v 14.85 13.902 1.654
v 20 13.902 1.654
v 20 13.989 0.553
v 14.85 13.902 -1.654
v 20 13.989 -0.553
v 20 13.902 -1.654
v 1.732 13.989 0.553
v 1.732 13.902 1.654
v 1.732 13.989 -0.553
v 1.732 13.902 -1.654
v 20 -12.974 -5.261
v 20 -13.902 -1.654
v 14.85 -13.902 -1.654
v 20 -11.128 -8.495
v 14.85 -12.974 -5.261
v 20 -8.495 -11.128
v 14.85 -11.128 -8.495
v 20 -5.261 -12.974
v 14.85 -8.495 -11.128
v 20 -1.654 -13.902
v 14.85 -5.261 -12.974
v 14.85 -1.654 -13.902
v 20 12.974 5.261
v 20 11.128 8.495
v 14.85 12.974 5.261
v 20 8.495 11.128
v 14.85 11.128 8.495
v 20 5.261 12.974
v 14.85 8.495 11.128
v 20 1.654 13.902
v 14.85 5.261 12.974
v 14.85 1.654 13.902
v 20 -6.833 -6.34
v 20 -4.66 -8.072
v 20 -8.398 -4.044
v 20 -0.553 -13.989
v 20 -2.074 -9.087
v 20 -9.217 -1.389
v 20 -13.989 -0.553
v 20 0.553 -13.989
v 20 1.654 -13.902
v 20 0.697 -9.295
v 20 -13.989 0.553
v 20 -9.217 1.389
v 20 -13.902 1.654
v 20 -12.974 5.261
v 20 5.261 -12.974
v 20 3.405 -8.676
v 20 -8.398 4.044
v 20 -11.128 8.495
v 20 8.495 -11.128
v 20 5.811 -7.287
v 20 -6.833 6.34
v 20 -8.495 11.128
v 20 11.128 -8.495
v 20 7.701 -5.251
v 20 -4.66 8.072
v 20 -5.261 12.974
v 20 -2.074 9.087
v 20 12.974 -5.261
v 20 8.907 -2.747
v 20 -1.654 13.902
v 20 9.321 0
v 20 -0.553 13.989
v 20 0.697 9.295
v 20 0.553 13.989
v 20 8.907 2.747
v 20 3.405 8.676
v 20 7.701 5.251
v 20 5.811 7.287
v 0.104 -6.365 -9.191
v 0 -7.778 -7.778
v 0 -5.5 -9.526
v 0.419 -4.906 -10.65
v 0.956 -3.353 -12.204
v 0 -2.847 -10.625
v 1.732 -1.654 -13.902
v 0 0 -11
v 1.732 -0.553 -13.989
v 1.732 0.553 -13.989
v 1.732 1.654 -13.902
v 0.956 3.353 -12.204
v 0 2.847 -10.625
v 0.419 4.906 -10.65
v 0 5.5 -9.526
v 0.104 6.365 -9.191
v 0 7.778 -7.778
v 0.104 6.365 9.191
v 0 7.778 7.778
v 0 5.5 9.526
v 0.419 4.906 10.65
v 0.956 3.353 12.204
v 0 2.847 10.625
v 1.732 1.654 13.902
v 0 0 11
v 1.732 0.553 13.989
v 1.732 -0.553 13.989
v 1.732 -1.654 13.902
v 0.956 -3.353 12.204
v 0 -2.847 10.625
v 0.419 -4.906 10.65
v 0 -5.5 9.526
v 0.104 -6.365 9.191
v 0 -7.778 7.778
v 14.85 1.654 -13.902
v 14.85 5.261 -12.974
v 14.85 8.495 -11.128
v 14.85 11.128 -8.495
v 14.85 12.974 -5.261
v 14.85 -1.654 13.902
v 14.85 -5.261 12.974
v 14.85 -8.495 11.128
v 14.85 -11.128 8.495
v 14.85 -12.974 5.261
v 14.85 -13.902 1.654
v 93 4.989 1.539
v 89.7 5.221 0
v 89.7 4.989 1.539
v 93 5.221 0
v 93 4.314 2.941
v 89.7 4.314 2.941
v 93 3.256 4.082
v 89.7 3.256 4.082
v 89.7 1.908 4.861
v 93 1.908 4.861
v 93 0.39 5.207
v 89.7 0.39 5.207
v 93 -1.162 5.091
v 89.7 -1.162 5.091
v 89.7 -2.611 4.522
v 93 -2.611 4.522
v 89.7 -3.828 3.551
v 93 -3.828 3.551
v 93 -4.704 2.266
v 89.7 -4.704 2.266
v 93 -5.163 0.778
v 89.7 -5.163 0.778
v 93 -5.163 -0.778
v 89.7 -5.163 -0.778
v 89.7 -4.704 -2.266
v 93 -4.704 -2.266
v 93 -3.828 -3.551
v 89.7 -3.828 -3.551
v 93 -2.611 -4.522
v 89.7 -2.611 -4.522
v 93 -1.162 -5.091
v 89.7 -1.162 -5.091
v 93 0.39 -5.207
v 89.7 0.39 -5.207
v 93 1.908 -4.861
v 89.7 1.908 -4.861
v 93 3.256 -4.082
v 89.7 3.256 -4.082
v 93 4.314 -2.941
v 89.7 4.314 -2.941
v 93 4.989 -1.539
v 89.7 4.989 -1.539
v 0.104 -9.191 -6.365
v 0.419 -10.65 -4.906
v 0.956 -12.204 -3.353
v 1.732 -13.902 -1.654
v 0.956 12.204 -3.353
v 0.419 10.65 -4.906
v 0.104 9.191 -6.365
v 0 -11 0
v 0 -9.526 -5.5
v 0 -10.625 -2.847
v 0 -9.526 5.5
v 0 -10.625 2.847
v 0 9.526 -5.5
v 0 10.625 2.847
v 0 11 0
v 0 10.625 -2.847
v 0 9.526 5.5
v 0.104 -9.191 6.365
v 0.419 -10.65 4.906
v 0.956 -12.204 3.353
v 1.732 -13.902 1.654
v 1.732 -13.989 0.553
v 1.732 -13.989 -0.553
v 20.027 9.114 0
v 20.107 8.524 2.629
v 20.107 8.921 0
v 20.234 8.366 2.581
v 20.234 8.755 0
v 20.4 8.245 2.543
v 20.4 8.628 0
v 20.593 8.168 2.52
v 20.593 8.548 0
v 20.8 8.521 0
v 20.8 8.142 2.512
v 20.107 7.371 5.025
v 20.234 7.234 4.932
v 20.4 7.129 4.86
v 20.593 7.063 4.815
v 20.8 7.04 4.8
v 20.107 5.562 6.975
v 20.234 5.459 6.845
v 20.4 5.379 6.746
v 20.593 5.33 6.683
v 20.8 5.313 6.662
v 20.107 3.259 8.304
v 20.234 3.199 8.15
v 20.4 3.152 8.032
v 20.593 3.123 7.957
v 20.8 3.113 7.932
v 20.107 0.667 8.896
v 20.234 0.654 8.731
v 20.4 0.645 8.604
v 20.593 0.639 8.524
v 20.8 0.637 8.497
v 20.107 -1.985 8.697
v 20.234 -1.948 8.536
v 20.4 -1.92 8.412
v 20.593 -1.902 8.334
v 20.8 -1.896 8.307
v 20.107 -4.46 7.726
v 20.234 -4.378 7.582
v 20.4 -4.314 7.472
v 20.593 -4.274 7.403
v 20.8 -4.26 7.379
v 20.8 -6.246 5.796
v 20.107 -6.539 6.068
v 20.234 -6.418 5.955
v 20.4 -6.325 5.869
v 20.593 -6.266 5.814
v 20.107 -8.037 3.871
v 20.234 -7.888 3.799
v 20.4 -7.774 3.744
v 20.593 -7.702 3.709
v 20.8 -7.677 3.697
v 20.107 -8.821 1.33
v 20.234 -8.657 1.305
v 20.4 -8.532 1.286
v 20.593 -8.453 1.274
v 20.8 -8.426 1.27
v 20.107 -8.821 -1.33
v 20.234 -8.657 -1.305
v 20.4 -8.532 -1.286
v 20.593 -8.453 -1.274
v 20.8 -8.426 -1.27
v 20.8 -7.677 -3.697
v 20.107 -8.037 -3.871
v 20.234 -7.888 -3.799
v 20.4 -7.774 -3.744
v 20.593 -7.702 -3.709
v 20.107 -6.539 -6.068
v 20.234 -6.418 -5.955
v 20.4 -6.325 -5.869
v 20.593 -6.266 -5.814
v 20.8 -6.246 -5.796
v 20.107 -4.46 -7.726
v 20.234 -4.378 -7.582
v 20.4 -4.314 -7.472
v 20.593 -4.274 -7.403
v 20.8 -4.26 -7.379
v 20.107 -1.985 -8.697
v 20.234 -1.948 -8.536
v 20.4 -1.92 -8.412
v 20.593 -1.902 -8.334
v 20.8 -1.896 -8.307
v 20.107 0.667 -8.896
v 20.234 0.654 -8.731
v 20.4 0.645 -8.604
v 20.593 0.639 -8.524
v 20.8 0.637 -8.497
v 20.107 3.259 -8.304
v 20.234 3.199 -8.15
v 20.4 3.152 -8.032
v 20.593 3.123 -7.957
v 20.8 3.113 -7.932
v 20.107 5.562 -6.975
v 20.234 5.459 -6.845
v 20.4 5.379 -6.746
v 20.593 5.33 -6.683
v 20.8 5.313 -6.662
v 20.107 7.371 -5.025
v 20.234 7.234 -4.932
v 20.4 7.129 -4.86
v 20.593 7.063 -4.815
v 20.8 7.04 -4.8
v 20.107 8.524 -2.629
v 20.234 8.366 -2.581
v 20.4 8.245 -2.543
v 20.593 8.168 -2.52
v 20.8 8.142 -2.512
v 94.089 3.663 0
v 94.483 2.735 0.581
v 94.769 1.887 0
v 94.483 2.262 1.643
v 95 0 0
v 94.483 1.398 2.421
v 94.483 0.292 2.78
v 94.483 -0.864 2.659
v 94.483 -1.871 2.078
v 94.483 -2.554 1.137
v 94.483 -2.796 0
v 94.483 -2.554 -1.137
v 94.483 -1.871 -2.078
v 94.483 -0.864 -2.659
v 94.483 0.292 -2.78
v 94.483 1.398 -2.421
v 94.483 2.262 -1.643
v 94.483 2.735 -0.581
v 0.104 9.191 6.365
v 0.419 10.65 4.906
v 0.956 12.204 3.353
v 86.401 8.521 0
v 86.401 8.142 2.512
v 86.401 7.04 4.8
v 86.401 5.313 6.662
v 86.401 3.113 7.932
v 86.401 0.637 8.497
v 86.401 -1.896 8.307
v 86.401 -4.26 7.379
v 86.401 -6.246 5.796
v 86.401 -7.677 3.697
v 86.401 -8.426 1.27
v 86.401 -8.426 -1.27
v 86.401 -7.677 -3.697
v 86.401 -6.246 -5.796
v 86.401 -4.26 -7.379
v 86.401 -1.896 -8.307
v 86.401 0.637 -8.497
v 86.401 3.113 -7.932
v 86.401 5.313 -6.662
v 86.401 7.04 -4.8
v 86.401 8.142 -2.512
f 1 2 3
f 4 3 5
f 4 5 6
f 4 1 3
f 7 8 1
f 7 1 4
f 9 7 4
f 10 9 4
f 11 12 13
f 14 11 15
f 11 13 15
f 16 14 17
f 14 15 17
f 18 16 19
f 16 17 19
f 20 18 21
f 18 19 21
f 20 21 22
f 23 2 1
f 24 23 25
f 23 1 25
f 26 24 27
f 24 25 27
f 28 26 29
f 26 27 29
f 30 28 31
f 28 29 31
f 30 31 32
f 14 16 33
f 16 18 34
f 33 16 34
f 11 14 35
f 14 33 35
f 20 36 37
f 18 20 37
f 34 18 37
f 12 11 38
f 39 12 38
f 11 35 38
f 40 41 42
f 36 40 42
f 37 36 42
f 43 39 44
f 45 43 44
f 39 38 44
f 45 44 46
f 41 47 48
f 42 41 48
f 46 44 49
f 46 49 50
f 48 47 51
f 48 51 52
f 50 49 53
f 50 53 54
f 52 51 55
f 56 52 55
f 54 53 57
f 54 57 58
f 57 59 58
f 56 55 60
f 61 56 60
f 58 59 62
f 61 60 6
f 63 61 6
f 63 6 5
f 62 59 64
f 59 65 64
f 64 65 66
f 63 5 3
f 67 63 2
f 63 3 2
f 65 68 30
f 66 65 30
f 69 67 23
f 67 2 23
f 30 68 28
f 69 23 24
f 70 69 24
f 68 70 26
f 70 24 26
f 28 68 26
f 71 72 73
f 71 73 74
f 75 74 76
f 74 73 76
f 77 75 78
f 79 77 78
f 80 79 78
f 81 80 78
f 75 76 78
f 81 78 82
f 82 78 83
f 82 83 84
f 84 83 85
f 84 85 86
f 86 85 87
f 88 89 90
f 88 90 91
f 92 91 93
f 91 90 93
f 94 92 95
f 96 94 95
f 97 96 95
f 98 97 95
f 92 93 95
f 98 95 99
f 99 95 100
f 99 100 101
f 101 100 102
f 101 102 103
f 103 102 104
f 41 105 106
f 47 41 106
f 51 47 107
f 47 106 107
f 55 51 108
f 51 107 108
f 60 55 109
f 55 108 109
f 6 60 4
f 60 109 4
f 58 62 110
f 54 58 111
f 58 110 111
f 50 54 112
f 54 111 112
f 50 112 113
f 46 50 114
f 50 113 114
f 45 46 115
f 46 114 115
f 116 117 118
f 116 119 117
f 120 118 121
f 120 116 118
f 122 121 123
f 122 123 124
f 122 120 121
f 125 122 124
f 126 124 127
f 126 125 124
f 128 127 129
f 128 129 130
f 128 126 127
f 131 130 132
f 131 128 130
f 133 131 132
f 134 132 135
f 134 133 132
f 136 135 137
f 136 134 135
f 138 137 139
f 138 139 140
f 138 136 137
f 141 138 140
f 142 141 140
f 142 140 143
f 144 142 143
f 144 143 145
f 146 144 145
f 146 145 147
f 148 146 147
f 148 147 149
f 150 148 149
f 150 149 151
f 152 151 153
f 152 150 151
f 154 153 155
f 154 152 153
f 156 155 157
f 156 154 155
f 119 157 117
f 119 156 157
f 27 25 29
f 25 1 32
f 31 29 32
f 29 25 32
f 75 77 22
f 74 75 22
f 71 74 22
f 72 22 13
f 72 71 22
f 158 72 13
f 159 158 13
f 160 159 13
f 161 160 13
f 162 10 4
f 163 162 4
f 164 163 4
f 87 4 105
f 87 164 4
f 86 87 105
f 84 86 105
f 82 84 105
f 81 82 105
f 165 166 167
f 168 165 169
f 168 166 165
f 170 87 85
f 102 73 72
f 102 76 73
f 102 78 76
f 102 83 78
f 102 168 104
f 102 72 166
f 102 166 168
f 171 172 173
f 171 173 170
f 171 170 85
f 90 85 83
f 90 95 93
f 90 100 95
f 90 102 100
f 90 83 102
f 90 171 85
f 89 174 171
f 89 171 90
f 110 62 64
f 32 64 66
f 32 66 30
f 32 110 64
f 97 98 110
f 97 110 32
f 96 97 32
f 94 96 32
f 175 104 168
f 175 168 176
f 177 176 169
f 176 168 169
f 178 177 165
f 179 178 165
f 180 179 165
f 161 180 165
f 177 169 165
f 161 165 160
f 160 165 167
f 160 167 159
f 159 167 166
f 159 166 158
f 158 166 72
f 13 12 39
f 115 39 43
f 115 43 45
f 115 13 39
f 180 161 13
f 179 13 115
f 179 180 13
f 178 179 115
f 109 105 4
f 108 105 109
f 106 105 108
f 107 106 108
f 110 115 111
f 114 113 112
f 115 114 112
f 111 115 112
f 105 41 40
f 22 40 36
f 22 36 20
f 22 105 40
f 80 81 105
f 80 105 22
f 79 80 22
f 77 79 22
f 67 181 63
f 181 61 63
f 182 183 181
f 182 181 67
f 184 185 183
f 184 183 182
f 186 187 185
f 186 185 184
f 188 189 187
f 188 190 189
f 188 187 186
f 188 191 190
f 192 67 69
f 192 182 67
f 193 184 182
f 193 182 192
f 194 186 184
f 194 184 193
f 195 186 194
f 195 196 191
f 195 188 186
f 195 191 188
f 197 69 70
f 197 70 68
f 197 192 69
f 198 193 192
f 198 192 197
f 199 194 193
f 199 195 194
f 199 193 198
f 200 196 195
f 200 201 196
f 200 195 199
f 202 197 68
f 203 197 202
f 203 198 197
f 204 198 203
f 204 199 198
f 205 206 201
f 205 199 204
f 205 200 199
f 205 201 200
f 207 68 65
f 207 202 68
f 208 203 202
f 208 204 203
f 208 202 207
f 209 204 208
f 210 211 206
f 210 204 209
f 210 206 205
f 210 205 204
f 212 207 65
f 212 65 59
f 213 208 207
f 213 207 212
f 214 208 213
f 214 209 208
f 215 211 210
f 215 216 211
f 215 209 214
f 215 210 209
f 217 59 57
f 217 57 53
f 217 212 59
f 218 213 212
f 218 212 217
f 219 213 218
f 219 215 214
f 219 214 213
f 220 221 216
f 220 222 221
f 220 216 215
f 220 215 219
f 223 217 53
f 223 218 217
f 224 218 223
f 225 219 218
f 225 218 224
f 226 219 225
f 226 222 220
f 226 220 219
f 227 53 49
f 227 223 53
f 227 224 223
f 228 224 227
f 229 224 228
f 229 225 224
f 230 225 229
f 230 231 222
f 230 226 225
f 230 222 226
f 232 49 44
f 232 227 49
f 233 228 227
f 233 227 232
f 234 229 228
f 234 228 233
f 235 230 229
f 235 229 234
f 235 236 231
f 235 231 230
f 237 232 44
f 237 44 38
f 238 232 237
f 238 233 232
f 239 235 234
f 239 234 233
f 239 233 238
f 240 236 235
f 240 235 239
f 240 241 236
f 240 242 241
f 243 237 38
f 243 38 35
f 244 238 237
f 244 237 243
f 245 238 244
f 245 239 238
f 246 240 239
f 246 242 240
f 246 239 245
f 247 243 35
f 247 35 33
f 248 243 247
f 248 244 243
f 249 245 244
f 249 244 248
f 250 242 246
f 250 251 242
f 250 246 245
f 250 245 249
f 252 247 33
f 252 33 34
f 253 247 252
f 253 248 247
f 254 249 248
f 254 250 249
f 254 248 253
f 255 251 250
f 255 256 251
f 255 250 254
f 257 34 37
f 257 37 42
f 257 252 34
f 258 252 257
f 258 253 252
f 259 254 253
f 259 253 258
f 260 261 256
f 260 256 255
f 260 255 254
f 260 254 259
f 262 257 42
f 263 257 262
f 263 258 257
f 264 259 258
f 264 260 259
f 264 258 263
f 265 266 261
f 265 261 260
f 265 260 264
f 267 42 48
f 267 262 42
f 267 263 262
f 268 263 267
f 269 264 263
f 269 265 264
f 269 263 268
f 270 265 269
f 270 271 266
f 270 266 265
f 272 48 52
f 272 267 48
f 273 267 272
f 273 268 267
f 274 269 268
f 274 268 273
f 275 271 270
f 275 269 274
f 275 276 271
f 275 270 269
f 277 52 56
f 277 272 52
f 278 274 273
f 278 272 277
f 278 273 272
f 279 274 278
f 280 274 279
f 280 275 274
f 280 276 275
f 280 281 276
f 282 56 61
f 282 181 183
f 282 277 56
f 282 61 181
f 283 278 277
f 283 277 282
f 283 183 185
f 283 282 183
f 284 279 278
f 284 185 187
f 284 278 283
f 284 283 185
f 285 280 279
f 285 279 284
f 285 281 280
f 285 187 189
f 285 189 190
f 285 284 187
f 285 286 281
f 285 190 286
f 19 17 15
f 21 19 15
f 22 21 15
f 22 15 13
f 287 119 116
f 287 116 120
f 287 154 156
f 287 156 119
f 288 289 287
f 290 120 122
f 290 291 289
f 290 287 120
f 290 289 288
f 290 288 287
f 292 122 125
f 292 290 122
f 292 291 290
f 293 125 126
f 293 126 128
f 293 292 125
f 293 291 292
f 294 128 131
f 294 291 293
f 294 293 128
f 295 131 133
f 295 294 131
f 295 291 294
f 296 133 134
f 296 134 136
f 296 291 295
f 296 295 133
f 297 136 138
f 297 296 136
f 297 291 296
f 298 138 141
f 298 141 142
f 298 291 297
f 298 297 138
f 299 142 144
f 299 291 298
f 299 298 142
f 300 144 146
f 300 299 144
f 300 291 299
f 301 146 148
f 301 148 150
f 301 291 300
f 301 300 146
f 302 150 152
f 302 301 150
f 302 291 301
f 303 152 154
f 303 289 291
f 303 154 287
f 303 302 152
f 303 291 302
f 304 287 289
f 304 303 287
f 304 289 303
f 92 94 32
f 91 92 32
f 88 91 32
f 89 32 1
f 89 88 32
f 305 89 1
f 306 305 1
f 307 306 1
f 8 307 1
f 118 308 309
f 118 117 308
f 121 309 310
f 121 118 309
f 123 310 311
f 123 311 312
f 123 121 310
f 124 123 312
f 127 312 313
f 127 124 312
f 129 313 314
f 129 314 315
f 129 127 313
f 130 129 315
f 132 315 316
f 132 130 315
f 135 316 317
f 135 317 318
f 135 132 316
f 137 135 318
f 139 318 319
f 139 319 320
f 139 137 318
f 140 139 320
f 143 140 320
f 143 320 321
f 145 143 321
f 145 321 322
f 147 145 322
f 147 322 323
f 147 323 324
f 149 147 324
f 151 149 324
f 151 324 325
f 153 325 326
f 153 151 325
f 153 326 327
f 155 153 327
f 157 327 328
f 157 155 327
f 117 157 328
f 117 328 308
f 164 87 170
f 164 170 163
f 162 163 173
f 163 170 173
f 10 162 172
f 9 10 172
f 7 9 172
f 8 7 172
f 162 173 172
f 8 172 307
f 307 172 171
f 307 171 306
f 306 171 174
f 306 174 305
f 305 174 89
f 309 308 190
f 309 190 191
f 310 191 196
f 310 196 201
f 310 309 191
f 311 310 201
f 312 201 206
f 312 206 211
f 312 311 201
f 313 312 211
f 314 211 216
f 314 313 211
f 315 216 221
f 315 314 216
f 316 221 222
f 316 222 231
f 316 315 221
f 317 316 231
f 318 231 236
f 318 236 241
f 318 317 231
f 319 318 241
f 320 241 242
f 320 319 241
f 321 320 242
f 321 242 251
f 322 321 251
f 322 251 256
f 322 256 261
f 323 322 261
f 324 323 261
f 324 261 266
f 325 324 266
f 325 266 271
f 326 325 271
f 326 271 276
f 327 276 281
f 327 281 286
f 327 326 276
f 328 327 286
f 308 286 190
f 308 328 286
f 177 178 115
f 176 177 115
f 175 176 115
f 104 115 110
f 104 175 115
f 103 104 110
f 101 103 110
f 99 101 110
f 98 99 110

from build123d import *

# Parameters (mm, degrees)
BASEHEAD_DEPTH = 20
COLLAR_START   = -5.15
COLLARSKE_R    = 14
COLLAR_DEPTH   = 5.15
HEADFILLET_R   = 0.8


# Read off the part's stored shape, not the designer's step: HeadChamfer
with BuildPart() as part:
    # SquareSke → BaseHead (new body)
    with BuildSketch(Plane(origin=(0, 0, 0), x_dir=(0, 0, -1), z_dir=(1, 0, 0))):
        with BuildLine():
            Line((13.90189895, -1.654450236), (1.654450236, -13.90189895))
            ThreePointArc((1.654450236, -13.90189895), (0, -14), (-1.654450236, -13.90189895))
            Line((-1.654450236, -13.90189895), (-13.90189895, -1.654450236))
            ThreePointArc((-13.90189895, -1.654450236), (-14, 0), (-13.90189895, 1.654450236))
            Line((-13.90189895, 1.654450236), (-1.654450236, 13.90189895))
            ThreePointArc((-1.654450236, 13.90189895), (0, 14), (1.654450236, 13.90189895))
            Line((1.654450236, 13.90189895), (13.90189895, 1.654450236))
            ThreePointArc((13.90189895, 1.654450236), (14, 0), (13.90189895, -1.654450236))
        make_face()
    extrude(amount=BASEHEAD_DEPTH)

    # HeadChamfer outline → HeadChamfer (revolve, cut)
    with BuildSketch(Plane.YX):
        Polygon((14.000000007, 1.732050812), (11, 0), (14.000000007, 0), align=None)
    revolve(axis=Axis((0, 0, 0), (1, 0, 0)), mode=Mode.SUBTRACT)

    # HeadChamfer 2 outline → HeadChamfer 2 (revolve)
    with BuildSketch(Plane.YX):
        with BuildLine():
            Line((5.221450167, 89.7), (5.221450173, 92.999999995))
            ThreePointArc((5.221450173, 92.999999995), (2.79569052, 94.482893893), (0, 95))
            Line((0, 95), (0, 20))
            Line((0, 20), (8.520797289, 20))
            Line((8.520797289, 20), (8.520797289, 86.400652878))
            Line((8.520797289, 86.400652878), (5.221450167, 89.7))
        make_face()
    revolve(axis=Axis((0, 0, 0), (1, 0, 0)))

    # CollarSke → Collar (add)
    with BuildSketch(Plane(origin=(20, 0, 0), x_dir=(0, 0, -1), z_dir=(1, 0, 0)).offset(COLLAR_START)):
        with Locations(Location((0, 0, 0), (0, 0, 173.213210702))):
            Circle(COLLARSKE_R)
    extrude(amount=COLLAR_DEPTH)

    # HeadFillet
    headfillet_edges = [part.edges().sort_by_distance(p)[0] for p in [
        (20, -8.520797289, 0),
    ]]
    fillet(headfillet_edges, radius=HEADFILLET_R)


solid = part.part
